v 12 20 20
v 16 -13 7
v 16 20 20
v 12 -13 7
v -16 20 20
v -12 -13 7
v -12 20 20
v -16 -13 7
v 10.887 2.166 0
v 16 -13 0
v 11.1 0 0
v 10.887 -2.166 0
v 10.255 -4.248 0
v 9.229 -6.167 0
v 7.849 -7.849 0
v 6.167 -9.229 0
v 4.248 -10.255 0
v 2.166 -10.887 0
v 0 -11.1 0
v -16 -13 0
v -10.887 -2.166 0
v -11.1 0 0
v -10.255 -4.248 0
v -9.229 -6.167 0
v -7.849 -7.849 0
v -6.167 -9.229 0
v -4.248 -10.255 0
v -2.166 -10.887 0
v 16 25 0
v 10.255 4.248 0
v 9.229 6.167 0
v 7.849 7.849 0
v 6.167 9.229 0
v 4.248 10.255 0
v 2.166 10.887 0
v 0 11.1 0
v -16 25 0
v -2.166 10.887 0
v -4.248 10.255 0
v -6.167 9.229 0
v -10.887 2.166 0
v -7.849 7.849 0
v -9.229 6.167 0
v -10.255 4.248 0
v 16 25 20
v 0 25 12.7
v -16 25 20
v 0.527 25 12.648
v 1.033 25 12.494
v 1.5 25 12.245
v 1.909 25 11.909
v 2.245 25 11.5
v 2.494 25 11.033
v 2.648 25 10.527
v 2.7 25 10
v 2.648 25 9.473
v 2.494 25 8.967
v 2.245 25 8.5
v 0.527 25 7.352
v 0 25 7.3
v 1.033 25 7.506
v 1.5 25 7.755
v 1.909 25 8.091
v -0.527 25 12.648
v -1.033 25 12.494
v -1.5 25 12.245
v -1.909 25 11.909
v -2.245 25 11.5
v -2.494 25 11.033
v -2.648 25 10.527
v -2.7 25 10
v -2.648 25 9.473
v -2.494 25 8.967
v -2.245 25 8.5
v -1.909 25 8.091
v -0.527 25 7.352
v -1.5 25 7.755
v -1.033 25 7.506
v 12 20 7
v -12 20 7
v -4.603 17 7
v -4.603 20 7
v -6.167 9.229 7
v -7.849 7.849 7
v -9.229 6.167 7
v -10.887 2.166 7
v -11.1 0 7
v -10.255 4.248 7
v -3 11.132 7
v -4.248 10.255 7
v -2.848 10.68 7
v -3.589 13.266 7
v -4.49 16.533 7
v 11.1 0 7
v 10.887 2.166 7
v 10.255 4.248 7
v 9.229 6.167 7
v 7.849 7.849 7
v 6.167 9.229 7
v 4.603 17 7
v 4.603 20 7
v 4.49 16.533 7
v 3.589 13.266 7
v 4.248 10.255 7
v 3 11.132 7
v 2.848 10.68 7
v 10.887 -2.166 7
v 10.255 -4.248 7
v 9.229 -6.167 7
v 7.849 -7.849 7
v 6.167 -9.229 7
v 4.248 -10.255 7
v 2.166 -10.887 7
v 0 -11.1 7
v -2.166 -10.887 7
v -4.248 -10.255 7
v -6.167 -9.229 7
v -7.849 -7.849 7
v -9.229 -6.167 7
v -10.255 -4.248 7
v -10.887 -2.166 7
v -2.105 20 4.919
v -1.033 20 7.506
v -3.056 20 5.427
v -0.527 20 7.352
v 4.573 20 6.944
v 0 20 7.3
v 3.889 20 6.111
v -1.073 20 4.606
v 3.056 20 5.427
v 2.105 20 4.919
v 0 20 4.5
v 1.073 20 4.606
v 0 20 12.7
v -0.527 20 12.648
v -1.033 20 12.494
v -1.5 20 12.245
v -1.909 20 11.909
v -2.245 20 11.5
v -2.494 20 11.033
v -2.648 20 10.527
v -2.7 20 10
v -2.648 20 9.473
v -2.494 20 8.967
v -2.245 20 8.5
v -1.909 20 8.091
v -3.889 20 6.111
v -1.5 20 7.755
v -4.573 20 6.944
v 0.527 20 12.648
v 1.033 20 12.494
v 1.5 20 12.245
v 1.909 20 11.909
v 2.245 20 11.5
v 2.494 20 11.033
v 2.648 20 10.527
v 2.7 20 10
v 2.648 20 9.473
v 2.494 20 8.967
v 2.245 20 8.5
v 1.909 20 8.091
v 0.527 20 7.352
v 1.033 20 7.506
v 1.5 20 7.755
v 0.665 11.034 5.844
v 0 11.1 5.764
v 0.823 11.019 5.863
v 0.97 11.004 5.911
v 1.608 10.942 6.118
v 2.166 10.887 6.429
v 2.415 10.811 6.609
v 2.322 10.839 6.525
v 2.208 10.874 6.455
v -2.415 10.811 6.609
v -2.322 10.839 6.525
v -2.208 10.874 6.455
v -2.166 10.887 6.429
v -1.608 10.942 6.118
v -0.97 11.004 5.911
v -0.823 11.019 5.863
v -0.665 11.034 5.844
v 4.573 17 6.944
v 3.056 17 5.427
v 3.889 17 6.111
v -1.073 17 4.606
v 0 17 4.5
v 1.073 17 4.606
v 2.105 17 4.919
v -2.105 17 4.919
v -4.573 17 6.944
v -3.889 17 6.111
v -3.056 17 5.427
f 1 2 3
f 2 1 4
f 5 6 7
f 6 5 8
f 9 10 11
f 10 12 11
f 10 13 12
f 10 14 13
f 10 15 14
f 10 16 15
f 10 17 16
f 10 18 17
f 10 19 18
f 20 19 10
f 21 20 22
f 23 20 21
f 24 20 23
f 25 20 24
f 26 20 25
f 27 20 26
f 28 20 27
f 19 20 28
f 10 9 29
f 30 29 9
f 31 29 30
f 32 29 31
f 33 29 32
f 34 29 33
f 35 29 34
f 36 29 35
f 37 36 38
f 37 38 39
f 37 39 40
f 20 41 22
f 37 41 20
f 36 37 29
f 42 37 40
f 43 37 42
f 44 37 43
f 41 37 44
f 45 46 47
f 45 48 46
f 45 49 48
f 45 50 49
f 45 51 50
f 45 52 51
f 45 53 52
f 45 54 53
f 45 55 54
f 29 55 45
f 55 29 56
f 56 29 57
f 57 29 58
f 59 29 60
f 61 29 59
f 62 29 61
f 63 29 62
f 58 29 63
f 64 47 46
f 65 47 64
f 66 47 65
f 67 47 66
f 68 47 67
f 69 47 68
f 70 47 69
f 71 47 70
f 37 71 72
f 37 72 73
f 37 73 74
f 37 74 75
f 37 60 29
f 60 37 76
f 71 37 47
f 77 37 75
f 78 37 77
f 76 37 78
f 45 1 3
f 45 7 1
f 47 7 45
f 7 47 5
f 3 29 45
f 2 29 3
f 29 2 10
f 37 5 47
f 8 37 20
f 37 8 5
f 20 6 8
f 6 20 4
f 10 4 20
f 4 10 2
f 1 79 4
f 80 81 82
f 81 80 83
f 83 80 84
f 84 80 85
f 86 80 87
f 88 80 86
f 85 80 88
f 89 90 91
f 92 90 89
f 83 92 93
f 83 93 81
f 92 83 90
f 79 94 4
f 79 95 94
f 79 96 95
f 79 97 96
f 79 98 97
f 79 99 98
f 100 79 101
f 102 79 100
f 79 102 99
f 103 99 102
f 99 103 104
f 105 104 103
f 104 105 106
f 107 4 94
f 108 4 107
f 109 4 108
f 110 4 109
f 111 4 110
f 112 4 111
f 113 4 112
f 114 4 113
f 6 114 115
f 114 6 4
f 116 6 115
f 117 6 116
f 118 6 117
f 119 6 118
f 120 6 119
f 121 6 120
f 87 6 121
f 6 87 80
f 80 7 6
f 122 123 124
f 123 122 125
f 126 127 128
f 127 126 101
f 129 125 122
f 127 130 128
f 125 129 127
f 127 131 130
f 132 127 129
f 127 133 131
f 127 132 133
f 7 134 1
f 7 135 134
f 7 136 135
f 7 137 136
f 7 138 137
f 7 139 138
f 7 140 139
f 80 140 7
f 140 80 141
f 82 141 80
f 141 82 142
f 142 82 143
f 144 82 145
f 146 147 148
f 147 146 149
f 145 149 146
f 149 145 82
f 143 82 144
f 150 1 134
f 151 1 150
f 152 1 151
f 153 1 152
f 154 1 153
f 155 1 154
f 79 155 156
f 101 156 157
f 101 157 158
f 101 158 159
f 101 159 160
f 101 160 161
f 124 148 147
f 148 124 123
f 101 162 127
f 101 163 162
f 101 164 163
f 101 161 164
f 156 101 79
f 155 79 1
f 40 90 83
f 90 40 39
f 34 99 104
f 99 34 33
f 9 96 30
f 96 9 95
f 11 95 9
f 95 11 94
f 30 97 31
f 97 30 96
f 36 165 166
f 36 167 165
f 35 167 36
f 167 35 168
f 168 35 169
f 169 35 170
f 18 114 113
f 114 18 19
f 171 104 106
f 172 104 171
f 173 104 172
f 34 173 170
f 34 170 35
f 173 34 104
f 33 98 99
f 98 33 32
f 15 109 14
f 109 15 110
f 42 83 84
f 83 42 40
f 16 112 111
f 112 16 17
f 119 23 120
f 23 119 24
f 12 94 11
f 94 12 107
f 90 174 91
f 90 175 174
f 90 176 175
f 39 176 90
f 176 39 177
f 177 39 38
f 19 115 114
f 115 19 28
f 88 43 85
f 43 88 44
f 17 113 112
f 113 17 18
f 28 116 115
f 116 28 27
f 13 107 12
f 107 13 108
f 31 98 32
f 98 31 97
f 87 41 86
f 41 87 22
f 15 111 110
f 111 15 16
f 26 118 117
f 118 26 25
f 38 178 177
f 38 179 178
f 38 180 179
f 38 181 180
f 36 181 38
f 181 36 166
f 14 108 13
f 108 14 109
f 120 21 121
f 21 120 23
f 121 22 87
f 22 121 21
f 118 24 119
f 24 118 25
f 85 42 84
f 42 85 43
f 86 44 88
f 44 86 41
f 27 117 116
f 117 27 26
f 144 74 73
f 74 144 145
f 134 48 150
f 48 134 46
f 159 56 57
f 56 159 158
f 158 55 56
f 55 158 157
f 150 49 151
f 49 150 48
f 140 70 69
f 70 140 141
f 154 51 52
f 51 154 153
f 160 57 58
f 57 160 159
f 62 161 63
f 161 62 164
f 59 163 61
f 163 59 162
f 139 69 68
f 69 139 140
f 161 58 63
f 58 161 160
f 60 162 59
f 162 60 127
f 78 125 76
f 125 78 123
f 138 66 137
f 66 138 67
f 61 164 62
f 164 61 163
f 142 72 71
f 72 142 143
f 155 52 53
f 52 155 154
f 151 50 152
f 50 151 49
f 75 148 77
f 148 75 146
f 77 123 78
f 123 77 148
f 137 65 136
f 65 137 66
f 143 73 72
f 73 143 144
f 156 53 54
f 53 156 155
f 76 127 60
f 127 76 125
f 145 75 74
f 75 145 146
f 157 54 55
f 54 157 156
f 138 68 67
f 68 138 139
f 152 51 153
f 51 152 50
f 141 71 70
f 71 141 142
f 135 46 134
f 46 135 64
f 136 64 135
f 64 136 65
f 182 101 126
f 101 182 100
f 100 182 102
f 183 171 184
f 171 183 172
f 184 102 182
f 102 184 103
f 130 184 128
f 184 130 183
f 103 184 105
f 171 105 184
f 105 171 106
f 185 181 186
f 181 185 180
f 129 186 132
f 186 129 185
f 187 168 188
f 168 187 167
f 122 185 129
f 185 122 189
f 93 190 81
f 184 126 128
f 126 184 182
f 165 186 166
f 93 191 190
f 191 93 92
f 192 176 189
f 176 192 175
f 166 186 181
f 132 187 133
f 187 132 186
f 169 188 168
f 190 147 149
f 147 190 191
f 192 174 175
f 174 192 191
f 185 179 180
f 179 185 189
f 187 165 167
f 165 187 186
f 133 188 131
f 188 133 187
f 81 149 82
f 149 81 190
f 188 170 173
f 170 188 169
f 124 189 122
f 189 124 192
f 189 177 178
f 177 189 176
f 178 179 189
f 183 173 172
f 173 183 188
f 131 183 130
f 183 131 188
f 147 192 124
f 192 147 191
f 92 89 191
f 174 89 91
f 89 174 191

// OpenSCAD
$fn=32;

mgn12h=13;
zconnh=12;
c=mgn12h+zconnh;
bearingd=24;
nemah=31;

l=bearingd/2+c;

difference() {
    union() {
        difference() {
            hull() {
                translate([-bearingd/2-4,-bearingd/2-1,0]) cube([bearingd+8,l+1,7]);
                translate([-bearingd/2-4,c-5,0]) cube([bearingd+8,5,20]);
            }
            translate([-bearingd/2,-bearingd/2-1,7]) cube([bearingd, l-5+1, 30]);
        } 
    }
    
    // bearing
    translate([0,0,-1]) {
        cylinder(d=22.2,h=10);
    }
    

    
    translate([0,c-6,10]) rotate([-90,0,0]) cylinder(d=5.4,h=10);
    hull() {
        translate([0,c-5,10]) rotate([90,0,0]) cylinder(d=11,h=3);
        translate([0,c-5,10]) rotate([90,0,0]) cylinder(d=8,h=10);
    }
}
